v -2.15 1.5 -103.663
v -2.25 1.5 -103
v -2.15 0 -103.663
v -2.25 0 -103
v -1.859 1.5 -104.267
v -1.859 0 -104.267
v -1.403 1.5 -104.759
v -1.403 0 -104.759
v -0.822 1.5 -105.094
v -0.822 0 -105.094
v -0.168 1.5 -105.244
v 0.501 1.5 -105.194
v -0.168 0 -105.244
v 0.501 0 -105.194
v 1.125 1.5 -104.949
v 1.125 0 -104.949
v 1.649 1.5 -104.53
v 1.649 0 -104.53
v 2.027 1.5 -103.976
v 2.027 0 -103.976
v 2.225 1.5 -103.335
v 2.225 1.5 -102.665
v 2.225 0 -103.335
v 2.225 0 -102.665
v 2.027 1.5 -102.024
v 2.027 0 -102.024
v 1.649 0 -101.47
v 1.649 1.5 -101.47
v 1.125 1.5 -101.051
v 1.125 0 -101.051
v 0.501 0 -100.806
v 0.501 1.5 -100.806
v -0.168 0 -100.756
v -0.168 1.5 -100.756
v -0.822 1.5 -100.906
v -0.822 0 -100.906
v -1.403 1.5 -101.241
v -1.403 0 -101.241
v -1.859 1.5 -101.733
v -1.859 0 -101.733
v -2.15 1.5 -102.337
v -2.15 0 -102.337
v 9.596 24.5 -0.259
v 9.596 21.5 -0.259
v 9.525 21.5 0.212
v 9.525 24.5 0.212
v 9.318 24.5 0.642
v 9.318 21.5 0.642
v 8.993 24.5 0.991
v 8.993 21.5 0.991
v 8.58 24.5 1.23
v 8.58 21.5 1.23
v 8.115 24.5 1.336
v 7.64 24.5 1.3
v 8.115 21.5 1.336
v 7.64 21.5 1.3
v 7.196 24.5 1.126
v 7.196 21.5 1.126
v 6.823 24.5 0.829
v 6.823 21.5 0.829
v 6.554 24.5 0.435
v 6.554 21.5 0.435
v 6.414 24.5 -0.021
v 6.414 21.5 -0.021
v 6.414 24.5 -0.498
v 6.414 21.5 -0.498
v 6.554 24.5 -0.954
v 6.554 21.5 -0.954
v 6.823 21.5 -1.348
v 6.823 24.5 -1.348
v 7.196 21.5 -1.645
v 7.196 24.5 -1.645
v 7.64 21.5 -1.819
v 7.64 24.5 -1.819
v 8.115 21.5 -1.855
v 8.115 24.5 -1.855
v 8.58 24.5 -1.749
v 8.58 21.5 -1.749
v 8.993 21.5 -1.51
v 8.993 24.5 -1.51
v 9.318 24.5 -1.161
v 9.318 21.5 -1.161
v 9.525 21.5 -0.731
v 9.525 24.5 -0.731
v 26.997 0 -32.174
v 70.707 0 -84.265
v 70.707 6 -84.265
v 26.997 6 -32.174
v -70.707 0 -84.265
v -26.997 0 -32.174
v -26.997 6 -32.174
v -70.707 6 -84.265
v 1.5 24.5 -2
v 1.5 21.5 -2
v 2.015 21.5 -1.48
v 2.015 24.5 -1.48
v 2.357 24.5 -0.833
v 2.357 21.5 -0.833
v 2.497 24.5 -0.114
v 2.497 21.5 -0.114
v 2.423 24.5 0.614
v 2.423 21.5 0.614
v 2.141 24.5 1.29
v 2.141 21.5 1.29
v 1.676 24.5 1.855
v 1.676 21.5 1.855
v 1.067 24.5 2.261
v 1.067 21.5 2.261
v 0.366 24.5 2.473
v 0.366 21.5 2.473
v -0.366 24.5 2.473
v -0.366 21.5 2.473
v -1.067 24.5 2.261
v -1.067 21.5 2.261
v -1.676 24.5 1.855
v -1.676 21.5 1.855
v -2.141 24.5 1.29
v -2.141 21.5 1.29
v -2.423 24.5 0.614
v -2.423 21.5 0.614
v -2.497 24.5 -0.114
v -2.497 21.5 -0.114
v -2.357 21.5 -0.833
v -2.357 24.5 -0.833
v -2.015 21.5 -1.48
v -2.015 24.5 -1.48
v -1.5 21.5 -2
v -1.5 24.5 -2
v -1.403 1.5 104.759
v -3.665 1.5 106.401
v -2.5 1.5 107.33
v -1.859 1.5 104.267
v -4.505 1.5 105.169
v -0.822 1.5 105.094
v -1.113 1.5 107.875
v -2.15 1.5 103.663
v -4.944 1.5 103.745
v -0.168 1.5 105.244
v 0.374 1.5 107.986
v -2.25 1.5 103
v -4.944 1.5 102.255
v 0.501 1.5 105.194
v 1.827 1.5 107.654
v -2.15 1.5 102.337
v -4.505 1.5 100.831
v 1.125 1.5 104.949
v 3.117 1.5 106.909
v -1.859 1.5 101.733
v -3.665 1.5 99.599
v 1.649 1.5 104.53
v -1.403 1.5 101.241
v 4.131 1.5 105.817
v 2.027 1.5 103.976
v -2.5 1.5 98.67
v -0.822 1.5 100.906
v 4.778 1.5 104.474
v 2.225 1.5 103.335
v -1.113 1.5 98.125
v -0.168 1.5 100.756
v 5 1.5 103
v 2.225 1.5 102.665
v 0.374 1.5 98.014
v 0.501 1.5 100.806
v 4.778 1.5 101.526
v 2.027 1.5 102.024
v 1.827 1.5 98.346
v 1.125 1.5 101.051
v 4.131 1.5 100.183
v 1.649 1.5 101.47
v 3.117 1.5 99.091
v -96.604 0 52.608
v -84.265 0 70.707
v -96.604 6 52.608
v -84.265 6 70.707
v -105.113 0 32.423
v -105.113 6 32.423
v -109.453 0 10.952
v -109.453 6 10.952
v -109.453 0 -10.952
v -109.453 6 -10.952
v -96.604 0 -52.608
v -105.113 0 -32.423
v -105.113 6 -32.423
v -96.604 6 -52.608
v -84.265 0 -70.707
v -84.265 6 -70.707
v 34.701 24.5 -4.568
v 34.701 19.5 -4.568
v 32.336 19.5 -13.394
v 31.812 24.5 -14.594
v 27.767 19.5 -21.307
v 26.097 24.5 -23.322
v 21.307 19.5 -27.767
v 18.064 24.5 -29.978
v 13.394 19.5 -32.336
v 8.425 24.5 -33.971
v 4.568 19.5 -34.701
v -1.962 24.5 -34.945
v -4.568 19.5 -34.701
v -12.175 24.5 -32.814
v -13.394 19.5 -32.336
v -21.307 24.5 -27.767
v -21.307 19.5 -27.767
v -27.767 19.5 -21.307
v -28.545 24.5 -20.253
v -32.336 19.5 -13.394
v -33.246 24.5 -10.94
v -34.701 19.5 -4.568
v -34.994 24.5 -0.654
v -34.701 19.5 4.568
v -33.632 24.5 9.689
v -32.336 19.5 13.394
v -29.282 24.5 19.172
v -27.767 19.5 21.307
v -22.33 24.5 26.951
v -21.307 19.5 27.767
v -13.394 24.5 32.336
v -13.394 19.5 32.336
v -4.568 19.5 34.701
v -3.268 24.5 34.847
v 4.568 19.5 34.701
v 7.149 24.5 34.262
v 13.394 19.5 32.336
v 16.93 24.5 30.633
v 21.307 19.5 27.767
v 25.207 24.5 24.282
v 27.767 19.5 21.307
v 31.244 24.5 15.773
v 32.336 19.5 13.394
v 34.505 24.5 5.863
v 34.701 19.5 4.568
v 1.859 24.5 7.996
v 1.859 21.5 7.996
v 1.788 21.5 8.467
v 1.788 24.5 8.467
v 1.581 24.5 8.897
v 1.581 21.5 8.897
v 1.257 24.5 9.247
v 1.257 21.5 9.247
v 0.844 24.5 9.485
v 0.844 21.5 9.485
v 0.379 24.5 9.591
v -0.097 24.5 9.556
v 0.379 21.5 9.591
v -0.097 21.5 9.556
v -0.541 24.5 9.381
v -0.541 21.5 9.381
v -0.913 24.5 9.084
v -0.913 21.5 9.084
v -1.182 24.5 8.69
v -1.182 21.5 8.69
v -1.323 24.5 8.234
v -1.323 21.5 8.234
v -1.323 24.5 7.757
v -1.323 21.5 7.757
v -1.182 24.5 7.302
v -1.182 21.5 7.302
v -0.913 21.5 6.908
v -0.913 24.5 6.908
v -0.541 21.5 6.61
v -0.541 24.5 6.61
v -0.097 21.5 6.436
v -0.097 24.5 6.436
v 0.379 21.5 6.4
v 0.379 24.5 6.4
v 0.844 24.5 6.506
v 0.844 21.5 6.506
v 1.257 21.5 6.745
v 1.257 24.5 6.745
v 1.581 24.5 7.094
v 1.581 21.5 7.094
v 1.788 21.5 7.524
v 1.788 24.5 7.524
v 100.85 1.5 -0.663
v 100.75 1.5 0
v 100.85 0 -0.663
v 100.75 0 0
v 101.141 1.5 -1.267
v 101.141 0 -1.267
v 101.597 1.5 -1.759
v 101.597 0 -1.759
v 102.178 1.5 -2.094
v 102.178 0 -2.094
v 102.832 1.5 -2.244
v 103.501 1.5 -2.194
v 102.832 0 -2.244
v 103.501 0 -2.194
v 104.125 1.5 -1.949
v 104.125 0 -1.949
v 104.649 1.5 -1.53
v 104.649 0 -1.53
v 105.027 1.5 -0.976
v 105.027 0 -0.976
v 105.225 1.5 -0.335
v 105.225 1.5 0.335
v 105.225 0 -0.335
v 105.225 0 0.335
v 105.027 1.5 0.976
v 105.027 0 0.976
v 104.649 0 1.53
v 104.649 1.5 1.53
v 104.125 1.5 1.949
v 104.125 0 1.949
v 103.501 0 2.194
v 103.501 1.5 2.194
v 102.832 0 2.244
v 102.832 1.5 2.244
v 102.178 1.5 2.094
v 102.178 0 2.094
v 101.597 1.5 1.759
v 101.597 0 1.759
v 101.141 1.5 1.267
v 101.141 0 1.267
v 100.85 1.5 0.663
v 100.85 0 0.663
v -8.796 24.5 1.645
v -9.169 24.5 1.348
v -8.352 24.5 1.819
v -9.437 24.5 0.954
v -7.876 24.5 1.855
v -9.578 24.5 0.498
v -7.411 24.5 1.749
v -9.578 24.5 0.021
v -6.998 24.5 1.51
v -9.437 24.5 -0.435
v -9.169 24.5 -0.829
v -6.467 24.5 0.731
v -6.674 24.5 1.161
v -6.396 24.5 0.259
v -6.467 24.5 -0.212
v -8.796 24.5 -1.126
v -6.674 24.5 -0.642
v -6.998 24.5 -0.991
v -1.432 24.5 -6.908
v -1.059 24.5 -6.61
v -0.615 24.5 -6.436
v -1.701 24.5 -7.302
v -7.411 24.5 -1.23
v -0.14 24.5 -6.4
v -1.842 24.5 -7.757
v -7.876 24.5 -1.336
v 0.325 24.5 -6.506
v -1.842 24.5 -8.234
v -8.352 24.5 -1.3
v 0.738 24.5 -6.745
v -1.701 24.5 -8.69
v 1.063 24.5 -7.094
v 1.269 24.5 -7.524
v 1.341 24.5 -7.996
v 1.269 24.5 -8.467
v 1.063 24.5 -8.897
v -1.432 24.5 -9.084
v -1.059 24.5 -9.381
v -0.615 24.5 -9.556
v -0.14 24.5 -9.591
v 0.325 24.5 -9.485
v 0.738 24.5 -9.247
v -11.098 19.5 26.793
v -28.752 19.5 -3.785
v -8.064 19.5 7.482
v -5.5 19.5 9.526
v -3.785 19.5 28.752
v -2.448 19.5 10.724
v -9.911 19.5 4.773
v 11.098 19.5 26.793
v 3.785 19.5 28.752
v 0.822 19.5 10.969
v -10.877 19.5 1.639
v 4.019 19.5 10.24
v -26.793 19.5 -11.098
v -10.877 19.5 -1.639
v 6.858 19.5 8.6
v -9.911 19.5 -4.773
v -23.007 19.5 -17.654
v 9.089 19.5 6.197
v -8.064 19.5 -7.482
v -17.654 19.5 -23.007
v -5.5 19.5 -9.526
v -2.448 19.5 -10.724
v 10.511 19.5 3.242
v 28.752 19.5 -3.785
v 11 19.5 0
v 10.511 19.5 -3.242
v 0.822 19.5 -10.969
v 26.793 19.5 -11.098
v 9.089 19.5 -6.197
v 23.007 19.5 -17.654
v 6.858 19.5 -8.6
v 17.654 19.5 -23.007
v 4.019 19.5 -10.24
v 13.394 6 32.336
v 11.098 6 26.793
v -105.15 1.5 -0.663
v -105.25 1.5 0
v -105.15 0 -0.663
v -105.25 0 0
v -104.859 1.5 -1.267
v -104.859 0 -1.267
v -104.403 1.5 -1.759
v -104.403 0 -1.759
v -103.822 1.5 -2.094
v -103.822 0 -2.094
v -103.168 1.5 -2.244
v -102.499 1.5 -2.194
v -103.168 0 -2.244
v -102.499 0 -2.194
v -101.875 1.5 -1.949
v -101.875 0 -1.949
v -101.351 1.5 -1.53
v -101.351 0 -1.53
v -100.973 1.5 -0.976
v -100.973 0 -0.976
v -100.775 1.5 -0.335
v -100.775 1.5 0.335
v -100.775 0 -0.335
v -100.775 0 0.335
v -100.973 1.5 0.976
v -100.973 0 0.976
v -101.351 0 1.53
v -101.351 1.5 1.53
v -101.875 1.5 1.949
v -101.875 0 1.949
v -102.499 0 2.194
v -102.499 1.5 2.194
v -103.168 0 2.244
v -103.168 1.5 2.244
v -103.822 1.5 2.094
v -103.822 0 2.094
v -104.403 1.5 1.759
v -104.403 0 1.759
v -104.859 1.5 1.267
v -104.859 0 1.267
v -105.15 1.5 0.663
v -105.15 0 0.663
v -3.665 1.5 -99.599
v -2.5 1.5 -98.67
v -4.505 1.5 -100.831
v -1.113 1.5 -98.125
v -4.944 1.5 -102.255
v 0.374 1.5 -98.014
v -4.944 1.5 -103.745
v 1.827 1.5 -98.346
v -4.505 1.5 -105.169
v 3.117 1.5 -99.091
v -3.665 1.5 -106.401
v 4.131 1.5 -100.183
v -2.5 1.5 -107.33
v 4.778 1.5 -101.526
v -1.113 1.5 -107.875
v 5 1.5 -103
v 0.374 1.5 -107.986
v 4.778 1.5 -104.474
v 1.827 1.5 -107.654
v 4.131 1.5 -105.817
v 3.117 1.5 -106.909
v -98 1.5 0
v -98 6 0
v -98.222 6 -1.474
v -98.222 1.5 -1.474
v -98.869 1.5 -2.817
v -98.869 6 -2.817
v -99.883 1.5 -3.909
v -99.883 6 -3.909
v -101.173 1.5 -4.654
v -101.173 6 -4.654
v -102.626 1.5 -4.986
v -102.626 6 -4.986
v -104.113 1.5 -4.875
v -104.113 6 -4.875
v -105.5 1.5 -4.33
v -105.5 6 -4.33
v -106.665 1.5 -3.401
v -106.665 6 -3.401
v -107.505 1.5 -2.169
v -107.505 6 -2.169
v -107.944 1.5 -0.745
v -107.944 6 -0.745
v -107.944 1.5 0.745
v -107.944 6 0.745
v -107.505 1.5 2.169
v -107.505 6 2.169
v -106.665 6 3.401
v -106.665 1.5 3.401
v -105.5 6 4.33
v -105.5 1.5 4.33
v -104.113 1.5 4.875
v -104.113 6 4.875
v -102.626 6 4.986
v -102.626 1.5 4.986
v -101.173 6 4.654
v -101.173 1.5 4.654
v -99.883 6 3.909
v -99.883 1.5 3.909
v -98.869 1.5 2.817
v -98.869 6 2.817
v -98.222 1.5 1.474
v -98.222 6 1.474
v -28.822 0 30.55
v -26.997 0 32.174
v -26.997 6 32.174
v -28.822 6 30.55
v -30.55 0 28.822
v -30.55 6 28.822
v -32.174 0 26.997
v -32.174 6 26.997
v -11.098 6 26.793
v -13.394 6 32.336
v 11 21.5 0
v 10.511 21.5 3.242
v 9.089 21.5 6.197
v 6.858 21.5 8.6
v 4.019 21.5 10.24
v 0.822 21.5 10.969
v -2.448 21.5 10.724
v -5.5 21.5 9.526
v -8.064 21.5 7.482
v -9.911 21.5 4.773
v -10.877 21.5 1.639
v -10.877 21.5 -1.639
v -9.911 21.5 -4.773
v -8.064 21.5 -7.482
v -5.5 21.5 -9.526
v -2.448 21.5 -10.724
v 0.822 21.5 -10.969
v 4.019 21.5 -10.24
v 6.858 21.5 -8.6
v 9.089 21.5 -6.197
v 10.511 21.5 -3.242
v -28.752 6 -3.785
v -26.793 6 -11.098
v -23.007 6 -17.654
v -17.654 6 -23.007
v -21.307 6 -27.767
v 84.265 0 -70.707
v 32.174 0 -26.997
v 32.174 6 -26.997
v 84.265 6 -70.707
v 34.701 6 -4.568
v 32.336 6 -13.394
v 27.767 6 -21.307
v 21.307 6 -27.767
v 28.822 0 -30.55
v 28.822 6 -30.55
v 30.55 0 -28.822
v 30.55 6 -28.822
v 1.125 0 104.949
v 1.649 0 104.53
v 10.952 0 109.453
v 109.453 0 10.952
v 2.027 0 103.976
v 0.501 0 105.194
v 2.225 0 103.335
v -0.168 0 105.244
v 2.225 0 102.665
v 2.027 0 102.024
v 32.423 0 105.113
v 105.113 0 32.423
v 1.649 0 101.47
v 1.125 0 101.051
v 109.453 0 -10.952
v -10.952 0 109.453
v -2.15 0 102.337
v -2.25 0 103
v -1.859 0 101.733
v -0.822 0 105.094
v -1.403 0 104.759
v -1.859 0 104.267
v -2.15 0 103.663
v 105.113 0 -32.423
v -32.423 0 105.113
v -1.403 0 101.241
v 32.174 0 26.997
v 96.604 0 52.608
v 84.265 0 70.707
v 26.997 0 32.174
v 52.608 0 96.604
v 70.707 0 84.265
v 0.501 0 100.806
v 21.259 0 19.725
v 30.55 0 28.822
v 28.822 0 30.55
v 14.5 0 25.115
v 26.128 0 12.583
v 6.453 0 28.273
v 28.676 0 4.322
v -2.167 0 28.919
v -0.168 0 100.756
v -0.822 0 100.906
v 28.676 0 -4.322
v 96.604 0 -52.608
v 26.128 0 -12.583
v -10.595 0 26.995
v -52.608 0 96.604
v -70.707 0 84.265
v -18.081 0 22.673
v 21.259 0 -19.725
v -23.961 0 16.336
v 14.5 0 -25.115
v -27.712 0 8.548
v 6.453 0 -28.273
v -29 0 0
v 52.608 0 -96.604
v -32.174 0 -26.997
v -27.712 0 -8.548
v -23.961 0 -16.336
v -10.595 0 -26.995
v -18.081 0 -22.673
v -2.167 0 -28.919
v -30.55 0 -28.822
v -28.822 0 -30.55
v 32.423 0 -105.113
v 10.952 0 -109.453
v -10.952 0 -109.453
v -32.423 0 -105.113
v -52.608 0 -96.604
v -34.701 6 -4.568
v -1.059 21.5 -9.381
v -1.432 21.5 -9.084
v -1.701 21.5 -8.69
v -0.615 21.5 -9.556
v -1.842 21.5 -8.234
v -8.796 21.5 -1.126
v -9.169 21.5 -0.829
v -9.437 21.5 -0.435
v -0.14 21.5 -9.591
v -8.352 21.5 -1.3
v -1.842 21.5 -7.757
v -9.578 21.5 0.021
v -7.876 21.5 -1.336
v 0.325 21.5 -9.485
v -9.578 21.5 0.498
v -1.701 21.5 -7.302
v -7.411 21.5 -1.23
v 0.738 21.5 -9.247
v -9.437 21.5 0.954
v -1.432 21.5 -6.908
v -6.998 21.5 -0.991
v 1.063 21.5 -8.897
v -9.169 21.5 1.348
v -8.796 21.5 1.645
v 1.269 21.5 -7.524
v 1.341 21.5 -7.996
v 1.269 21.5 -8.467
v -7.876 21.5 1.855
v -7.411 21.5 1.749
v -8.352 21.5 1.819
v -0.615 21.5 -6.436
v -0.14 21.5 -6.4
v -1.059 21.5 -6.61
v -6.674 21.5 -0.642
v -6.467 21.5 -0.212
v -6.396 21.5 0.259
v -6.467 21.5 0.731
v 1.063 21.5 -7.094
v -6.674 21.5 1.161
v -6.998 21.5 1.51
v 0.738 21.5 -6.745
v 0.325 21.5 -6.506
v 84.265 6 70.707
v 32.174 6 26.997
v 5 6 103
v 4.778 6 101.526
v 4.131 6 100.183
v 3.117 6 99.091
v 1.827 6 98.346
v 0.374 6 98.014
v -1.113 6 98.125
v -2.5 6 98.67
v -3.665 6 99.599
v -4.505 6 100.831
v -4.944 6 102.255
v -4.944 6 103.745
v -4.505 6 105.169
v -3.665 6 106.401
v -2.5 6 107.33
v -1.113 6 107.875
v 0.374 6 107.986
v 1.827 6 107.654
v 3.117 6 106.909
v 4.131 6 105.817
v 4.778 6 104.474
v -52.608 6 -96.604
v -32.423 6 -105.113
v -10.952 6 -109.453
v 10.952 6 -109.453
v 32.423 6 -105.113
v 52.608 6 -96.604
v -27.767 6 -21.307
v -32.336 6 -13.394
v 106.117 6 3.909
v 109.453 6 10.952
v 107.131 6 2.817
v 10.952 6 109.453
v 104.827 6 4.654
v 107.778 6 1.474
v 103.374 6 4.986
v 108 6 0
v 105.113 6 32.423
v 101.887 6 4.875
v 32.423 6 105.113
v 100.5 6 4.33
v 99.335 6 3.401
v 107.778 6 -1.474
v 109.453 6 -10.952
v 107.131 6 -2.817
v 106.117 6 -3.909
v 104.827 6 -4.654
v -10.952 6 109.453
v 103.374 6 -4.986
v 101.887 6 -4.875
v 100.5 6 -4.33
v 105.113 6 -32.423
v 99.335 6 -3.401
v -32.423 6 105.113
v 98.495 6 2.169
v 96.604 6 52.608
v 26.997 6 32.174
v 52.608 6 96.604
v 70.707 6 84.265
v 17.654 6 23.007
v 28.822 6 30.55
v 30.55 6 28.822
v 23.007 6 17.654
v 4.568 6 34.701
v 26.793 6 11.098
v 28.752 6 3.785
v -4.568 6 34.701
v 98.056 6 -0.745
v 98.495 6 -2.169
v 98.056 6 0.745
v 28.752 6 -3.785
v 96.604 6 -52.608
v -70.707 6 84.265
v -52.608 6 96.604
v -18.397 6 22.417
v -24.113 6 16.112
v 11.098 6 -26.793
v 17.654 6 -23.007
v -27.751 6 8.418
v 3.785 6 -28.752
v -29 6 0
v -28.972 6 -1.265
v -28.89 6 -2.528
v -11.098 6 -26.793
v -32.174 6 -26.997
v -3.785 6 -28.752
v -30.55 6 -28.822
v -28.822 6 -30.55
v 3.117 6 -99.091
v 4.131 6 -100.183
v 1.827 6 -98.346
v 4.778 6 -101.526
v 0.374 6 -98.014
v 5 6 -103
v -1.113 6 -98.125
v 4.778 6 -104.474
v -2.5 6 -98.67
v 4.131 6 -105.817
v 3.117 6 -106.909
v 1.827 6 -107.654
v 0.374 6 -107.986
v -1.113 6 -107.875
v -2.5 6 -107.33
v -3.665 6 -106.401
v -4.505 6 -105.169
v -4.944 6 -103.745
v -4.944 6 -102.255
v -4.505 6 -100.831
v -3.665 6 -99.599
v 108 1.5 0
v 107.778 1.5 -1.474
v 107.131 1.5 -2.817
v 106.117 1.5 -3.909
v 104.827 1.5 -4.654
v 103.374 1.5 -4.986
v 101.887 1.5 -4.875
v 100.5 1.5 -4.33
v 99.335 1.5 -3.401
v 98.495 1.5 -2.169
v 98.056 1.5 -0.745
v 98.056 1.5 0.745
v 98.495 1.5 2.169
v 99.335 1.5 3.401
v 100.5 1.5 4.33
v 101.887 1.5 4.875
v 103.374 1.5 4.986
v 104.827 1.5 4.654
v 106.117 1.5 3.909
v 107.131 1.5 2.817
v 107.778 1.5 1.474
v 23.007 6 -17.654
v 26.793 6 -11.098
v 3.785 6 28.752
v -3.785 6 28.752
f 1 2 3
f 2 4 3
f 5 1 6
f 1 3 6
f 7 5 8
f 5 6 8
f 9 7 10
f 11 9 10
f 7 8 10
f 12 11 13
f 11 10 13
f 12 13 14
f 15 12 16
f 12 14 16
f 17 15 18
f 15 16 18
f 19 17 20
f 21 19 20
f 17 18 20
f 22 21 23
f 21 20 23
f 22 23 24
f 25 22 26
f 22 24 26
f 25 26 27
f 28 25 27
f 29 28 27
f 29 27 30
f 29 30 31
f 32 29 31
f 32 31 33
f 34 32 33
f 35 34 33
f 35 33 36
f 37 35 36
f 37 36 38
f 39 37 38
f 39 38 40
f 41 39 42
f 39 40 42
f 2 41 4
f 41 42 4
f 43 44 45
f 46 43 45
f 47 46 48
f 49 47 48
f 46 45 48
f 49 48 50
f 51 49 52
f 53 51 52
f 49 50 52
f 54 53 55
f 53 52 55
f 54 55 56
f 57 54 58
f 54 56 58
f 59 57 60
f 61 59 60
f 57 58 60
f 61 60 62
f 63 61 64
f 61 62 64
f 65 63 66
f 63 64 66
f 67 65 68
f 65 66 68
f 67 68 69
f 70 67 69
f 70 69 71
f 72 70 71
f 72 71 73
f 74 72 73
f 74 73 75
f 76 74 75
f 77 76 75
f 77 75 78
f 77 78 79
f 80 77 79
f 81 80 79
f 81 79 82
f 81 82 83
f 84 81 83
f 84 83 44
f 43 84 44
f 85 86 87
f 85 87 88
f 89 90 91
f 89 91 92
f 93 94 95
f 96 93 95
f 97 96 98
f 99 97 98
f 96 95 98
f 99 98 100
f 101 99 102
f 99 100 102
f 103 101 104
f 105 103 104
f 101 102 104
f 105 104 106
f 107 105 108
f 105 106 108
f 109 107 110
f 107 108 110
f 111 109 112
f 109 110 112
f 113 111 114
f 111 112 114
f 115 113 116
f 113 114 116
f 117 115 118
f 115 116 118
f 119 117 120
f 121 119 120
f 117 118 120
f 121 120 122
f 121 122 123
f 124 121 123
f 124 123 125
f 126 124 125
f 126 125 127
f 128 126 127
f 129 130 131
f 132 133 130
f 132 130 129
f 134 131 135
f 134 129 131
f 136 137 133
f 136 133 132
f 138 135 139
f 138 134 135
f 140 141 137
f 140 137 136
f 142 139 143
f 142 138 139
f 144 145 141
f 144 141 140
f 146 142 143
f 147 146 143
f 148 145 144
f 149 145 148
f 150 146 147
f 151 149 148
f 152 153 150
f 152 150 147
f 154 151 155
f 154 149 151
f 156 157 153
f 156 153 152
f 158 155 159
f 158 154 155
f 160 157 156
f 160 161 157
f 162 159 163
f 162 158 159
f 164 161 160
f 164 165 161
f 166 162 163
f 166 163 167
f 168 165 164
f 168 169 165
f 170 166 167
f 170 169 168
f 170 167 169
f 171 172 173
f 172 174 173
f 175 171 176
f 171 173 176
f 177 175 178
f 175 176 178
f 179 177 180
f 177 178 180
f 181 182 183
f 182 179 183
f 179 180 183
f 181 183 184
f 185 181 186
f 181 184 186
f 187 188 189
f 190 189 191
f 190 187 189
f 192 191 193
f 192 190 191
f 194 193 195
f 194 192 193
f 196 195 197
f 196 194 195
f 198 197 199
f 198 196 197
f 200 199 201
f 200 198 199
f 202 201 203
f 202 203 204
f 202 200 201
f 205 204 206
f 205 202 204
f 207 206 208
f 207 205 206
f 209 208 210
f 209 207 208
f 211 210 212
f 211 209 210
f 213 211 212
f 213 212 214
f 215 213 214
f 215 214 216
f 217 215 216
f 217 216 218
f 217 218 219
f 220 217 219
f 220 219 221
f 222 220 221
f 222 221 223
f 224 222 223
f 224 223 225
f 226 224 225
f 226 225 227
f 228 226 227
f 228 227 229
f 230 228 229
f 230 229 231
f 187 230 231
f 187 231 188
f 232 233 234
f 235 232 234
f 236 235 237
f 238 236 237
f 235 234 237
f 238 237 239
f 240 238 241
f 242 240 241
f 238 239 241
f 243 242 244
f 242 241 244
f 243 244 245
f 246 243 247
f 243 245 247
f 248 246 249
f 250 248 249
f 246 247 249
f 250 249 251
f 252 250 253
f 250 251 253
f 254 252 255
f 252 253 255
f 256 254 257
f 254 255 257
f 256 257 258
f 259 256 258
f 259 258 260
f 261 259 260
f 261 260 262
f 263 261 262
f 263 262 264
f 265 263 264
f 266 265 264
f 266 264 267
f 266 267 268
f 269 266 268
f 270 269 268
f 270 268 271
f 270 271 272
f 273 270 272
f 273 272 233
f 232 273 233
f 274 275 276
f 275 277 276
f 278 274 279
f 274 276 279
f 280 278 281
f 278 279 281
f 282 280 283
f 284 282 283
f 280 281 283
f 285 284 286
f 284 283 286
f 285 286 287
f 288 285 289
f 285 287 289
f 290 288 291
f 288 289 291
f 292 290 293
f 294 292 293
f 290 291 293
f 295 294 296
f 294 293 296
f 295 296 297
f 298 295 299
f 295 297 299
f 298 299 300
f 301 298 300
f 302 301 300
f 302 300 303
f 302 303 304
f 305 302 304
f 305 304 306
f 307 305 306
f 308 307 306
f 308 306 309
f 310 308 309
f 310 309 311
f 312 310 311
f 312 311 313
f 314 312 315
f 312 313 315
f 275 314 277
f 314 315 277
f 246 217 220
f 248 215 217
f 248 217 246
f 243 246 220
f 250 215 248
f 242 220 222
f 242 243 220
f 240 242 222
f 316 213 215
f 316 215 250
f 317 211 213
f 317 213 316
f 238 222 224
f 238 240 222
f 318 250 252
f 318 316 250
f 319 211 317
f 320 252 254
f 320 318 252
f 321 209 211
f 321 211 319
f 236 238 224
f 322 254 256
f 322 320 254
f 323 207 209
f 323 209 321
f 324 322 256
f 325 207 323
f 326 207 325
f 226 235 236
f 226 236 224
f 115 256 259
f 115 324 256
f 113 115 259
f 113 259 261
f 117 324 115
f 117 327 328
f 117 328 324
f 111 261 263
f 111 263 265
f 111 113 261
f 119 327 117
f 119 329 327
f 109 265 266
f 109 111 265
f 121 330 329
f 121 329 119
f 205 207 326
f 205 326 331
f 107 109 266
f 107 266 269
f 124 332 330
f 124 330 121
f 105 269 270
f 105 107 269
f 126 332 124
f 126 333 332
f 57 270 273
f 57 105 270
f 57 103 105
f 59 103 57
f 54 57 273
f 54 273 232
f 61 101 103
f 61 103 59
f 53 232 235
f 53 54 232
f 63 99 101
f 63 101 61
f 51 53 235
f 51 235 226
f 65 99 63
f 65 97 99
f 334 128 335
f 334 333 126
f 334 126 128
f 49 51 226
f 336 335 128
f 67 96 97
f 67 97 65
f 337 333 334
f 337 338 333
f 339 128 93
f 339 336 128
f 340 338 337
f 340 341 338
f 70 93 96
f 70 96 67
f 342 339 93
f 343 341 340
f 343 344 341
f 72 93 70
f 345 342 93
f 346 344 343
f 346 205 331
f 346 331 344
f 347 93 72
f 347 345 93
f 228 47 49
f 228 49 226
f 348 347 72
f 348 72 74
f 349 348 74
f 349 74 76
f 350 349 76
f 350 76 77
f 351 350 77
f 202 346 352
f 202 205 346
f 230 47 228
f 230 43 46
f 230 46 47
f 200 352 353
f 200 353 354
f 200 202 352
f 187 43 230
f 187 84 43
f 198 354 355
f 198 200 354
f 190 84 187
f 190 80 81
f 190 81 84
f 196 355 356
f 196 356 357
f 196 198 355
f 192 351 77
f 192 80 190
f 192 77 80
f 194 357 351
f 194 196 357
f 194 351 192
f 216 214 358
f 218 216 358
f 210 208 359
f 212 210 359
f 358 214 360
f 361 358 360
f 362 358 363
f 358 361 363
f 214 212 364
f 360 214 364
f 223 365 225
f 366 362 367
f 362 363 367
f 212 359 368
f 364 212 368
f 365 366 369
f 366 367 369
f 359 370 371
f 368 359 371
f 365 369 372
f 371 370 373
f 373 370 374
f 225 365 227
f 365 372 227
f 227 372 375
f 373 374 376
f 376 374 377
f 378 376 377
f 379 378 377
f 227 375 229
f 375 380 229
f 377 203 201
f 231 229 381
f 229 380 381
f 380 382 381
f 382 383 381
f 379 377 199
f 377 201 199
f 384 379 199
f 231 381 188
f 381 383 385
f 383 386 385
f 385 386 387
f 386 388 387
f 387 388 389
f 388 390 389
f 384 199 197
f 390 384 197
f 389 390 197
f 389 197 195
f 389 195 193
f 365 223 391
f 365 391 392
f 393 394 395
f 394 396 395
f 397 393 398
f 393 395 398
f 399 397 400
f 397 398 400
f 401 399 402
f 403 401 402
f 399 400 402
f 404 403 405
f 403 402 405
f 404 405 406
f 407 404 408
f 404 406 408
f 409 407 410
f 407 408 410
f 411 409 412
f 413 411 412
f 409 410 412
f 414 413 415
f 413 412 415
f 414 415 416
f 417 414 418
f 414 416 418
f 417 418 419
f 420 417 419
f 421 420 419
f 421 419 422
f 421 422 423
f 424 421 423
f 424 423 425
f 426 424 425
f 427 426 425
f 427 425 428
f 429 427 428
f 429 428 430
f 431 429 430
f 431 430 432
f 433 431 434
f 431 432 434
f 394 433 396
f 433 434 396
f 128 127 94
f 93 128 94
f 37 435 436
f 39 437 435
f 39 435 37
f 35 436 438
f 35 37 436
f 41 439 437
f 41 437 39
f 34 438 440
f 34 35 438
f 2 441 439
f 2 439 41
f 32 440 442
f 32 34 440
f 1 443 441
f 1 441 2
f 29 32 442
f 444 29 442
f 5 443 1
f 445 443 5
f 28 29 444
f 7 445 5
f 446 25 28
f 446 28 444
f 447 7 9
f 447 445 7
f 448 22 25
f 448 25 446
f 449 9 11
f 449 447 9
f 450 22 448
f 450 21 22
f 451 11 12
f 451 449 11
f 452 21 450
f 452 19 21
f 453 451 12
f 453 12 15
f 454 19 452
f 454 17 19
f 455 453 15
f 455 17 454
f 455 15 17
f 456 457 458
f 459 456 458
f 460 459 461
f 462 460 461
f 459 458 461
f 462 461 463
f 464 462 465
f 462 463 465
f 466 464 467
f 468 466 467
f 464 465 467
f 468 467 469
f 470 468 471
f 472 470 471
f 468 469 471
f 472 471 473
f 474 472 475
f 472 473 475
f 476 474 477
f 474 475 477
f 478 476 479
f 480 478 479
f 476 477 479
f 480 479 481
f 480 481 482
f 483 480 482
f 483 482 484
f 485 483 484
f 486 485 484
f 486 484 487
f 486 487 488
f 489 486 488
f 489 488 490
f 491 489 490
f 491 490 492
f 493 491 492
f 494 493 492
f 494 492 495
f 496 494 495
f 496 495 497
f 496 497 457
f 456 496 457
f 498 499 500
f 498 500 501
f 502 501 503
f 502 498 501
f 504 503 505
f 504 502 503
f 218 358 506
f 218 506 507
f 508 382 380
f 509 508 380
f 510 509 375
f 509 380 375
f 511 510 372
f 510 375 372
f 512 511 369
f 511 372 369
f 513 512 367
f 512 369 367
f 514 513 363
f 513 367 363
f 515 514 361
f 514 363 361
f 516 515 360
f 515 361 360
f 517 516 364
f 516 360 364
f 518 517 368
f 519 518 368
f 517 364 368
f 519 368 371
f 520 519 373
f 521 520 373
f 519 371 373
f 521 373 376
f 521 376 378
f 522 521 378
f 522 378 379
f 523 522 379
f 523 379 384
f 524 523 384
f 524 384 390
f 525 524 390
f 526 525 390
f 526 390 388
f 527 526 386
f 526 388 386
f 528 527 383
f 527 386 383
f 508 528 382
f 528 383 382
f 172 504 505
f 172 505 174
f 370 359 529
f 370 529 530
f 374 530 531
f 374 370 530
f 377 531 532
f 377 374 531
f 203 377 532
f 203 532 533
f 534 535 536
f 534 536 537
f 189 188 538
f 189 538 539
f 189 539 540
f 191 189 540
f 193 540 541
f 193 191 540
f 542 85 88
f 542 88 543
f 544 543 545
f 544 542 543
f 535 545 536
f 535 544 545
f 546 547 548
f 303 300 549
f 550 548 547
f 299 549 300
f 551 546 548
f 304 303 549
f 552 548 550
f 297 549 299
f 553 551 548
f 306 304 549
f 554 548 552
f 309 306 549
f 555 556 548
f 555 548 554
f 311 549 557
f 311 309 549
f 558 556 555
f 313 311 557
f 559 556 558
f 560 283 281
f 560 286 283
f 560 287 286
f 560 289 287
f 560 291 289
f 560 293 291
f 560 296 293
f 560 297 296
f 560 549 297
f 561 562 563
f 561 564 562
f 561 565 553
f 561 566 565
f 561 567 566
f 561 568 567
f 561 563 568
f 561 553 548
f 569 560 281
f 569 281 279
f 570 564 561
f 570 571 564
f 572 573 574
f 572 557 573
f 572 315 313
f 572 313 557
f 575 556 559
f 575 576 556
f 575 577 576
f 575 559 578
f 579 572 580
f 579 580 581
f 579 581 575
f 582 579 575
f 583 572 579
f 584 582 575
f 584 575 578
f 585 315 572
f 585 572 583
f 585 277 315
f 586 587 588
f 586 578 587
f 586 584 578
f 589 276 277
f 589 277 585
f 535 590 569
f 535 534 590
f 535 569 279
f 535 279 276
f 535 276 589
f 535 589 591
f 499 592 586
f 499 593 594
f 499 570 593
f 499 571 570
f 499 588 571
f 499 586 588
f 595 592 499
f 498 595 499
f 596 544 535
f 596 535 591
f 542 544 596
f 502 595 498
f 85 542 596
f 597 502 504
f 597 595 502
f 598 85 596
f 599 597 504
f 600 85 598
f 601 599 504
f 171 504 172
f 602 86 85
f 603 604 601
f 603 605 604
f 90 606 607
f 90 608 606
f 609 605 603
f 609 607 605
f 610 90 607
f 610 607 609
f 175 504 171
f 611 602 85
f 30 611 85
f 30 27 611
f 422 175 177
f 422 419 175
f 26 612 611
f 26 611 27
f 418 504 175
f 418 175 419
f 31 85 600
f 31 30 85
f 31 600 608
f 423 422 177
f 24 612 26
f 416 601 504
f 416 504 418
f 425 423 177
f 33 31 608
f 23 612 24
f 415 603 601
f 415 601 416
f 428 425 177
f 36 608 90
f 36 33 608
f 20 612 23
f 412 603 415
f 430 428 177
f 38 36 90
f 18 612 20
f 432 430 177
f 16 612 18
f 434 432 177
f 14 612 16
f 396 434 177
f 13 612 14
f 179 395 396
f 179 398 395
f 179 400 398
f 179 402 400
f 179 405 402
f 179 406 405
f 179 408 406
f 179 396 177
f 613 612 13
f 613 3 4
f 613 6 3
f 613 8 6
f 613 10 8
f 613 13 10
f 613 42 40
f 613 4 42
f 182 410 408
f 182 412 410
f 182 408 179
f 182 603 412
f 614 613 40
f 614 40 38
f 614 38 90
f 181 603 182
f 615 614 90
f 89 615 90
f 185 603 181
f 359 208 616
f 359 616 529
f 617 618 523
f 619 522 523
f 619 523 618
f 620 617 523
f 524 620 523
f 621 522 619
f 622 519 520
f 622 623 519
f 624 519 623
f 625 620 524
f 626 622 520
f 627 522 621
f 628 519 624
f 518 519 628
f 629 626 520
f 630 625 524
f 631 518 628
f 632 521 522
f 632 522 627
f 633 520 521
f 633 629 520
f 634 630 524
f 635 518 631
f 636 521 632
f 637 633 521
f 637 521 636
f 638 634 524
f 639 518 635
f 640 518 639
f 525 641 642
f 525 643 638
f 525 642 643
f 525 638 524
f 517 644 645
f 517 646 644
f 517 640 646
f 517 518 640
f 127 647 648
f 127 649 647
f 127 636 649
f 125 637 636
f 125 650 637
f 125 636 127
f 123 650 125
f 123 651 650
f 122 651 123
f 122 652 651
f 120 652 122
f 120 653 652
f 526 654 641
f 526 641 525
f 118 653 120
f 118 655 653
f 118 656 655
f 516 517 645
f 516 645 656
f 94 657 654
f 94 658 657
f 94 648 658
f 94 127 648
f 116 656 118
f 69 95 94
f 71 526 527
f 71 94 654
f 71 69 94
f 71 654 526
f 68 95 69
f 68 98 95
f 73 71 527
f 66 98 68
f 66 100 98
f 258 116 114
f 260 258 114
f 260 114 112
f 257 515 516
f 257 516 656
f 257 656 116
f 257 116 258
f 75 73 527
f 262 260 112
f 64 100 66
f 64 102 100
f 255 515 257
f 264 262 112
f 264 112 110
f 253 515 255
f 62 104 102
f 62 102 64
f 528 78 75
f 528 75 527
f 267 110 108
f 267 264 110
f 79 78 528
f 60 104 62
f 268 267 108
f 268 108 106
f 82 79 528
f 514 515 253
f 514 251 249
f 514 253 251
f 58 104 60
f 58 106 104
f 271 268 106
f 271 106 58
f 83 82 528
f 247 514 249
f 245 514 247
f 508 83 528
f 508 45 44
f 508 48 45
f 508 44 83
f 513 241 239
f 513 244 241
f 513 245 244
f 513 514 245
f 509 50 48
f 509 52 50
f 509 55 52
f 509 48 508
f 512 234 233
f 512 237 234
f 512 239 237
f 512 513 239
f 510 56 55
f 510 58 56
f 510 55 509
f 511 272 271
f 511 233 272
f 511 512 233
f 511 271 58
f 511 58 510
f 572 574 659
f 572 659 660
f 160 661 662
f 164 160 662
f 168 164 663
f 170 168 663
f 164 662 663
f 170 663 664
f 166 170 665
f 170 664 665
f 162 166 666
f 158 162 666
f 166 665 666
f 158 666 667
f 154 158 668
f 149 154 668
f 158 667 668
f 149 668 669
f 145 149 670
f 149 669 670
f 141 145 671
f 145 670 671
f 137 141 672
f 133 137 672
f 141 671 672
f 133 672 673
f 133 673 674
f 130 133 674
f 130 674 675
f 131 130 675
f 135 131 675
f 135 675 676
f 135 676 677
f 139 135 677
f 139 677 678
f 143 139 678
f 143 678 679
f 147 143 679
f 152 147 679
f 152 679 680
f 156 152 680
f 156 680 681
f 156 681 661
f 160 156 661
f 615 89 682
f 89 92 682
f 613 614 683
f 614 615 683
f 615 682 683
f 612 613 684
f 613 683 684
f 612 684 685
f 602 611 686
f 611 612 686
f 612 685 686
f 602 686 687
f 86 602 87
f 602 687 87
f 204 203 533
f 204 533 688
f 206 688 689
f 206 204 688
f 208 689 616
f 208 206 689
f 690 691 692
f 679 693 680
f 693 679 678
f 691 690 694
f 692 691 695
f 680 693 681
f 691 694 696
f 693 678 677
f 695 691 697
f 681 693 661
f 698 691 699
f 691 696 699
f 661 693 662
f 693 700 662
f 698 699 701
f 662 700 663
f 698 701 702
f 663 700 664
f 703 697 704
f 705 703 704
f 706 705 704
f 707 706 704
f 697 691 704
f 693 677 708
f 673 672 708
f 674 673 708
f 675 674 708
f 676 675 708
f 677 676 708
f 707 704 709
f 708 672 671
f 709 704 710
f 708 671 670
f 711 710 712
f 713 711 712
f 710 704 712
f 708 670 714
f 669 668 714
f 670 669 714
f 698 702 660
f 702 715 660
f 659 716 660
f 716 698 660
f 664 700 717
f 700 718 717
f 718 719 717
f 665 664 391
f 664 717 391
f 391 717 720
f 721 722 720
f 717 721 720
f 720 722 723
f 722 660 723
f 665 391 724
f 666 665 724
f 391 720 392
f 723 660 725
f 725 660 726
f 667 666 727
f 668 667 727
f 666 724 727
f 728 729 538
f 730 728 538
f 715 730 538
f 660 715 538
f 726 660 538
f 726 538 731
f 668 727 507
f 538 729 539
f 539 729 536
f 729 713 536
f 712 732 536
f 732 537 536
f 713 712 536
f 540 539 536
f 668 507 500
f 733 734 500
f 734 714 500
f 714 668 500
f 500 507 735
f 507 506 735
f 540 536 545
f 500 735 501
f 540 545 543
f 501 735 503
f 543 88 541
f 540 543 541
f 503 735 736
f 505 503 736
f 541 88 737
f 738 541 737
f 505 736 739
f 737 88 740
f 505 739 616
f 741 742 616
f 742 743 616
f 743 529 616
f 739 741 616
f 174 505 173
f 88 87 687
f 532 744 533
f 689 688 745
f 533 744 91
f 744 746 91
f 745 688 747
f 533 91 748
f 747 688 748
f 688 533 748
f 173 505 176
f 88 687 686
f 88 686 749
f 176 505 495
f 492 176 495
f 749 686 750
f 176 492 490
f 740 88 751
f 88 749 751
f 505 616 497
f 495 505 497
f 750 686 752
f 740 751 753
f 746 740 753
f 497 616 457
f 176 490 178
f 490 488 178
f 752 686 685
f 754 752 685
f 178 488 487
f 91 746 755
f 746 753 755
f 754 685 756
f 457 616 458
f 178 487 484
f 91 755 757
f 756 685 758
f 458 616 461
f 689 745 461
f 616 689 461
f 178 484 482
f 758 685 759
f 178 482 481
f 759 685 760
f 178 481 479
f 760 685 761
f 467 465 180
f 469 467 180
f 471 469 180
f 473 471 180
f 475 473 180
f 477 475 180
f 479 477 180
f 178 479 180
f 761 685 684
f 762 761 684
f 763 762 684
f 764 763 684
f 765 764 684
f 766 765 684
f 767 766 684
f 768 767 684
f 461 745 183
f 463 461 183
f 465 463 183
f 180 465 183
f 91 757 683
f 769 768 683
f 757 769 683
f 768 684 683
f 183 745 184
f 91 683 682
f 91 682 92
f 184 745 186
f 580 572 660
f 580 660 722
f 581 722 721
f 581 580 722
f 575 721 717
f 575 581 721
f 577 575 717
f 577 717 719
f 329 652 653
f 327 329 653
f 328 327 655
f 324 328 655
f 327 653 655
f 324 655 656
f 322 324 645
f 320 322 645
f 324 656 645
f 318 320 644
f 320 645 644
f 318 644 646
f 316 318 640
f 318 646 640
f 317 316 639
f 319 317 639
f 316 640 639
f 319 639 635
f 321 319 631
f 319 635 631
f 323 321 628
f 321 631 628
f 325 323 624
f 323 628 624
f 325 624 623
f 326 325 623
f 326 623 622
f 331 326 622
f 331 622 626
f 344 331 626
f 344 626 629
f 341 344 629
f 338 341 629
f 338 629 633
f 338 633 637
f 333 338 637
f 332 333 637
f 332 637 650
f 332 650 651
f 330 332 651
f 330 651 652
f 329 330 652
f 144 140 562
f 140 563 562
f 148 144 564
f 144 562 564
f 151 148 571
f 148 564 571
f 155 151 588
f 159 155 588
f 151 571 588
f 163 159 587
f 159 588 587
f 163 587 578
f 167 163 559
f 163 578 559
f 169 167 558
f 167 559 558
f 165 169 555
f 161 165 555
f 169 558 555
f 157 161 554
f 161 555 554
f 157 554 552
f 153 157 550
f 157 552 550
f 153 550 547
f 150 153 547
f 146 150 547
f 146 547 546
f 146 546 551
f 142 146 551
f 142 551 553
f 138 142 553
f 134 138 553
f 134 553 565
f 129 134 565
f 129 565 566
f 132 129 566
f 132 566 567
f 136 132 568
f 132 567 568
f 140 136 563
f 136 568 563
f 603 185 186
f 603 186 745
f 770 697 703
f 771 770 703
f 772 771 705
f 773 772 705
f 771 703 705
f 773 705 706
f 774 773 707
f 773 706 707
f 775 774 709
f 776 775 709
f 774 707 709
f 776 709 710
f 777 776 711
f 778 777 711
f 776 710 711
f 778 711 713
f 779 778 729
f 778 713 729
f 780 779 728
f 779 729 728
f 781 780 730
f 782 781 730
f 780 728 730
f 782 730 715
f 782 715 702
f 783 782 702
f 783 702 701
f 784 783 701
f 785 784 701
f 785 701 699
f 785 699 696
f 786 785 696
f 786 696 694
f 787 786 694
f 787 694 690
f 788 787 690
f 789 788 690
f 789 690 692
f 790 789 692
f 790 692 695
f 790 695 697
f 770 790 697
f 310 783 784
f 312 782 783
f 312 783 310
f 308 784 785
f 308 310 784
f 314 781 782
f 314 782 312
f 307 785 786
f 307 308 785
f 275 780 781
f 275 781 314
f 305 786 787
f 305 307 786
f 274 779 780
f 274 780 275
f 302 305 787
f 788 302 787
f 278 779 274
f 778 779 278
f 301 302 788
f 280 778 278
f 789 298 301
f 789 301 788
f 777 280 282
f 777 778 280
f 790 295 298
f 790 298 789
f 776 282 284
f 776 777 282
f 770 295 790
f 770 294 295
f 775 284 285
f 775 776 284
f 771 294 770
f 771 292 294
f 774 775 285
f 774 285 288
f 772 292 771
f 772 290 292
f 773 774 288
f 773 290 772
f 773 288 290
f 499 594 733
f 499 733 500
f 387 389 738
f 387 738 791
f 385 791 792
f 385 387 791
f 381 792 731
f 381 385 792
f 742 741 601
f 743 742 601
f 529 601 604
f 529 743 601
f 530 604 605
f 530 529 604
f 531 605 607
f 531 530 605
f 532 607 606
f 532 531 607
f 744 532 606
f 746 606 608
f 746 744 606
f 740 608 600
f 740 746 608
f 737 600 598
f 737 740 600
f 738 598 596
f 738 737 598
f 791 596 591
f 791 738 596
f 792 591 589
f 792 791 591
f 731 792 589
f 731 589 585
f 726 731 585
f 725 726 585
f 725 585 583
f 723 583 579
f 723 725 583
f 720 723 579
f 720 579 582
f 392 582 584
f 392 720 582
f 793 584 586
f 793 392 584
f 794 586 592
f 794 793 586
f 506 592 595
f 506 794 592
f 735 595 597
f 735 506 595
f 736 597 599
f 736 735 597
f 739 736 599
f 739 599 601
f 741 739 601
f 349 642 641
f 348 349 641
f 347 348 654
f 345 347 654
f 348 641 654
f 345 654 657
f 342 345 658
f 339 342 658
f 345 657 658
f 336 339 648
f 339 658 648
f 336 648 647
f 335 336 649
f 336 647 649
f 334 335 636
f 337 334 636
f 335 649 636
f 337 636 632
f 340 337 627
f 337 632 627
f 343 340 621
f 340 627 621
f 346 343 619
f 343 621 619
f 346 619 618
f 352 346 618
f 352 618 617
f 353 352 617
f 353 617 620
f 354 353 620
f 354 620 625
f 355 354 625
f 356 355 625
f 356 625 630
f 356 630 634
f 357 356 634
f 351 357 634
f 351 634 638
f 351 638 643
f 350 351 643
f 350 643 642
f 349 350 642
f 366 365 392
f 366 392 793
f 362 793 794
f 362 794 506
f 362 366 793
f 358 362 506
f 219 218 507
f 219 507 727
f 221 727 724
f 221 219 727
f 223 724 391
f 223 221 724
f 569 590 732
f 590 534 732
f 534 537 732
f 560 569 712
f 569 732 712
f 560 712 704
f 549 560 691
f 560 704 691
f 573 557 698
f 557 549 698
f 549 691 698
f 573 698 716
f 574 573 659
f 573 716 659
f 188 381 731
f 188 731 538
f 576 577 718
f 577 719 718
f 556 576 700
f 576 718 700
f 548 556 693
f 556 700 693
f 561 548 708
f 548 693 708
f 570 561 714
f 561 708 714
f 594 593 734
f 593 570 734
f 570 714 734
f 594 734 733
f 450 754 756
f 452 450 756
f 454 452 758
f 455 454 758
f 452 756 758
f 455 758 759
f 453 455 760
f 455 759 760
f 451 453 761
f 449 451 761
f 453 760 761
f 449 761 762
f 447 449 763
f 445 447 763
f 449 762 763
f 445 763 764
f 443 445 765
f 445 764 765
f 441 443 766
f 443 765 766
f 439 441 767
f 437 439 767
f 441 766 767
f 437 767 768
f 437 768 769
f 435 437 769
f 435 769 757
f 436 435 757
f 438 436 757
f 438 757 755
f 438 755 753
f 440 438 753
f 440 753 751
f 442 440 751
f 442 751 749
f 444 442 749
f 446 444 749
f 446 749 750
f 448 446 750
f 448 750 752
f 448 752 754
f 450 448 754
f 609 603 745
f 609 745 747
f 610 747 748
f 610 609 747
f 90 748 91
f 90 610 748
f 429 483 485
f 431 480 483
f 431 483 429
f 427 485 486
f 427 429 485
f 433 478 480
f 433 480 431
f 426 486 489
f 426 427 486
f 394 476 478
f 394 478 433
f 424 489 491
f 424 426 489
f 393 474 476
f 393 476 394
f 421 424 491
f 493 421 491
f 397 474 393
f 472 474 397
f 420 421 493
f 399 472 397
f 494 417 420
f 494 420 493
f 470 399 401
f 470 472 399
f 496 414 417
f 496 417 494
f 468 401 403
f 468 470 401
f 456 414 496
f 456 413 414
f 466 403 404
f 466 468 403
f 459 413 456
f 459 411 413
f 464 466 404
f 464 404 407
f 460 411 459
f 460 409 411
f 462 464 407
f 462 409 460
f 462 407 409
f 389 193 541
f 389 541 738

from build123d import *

# Parameters (mm, degrees)
SCHIZZO1_W                                          = 81
SCHIZZO1_H                                          = 6
ESTRUSIONE_ESTRUSIONE2_START                        = 13.5
ESTRUSIONE_ESTRUSIONE2_DEPTH                        = 13.5
ESTRUSIONE_ESTRUSIONE3_START                        = 5
SCHIZZO4_R                                          = 35
ESTRUSIONE_ESTRUSIONE3_DEPTH                        = 5
TAGLIA_RIVOLUZIONE2_DEPTH                           = 6
RIPETIZIONECIRCOLARE1_COUNT                         = 4
SCHIZZO6_R                                          = 11
TAGLIO_ESTRUSIONE2_DEPTH                            = 2
SCHIZZO7_R                                          = 1.6
TAGLIO_ESTRUSIONE3_DEPTH                            = 22
FORO_LAMATO_PER_VITE_M4_A_TESTA_SOTTILE_D           = 4.5
FORO_LAMATO_PER_VITE_M4_A_TESTA_SOTTILE_DEPTH       = 9
FORO_LAMATO_PER_VITE_M4_A_TESTA_SOTTILE_CBORE_D     = 10
FORO_LAMATO_PER_VITE_M4_A_TESTA_SOTTILE_CBORE_DEPTH = 4.5
FORO_LAMATO_PER_VITE_M4_A_TESTA_SOTTILE_TIP         = 1.351936393


# Read off the part's stored shape, not the designer's step: Taglia-Rivoluzione2
with BuildPart() as part:
    # Schizzo1 → Rivoluzione1 (revolve)
    with BuildSketch(Plane.XY):
        with Locations((-69.5, 3)):
            Rectangle(SCHIZZO1_W, SCHIZZO1_H)
    revolve(axis=Axis((0, 30.5, 0), (0, -1, 0)))

    # Schizzo3 → Estrusione-Estrusione2 (add)
    with BuildSketch(Plane(origin=(0, 6, 0), x_dir=(1, 0, 0), z_dir=(0, 1, 0)).offset(ESTRUSIONE_ESTRUSIONE2_START)):
        with BuildLine():
            Line((21.306650015, 27.76736691), (17.654081441, 23.007246868))
            ThreePointArc((17.654081441, 23.007246868), (25.11473671, 14.5), (28.75190098, 3.785259574))
            Line((28.75190098, 3.785259574), (34.700570148, 4.568416728))
            ThreePointArc((34.700570148, 4.568416728), (30.310889132, 17.5), (21.306650015, 27.76736691))
        make_face()
        with BuildLine():
            ThreePointArc((-21.306650015, 27.76736691), (-30.310889132, 17.5), (-34.700570148, 4.568416728))
            Line((-34.700570148, 4.568416728), (-28.75190098, 3.785259574))
            ThreePointArc((-28.75190098, 3.785259574), (-25.11473671, 14.5), (-17.654081441, 23.007246868))
            Line((-17.654081441, 23.007246868), (-21.306650015, 27.76736691))
        make_face()
        with BuildLine():
            ThreePointArc((-13.393920133, -32.335783638), (0, -35), (13.393920133, -32.335783638))
            Line((13.393920133, -32.335783638), (11.097819539, -26.792506443))
            ThreePointArc((11.097819539, -26.792506443), (0, -29), (-11.097819539, -26.792506443))
            Line((-11.097819539, -26.792506443), (-13.393920133, -32.335783638))
        make_face()
    extrude(amount=-ESTRUSIONE_ESTRUSIONE2_DEPTH)

    # Schizzo4 → Estrusione-Estrusione3 (add)
    with BuildSketch(Plane(origin=(0, 19.5, 0), x_dir=(1, 0, 0), z_dir=(0, 1, 0)).offset(ESTRUSIONE_ESTRUSIONE3_START)):
        with Locations(Location((0, 0, 0), (0, 0, 7.5))):
            Circle(SCHIZZO4_R)
    extrude(amount=-ESTRUSIONE_ESTRUSIONE3_DEPTH)

    # Taglia-Rivoluzione2 outline → Taglia-Rivoluzione2 (cut)
    with BuildSketch(Plane(origin=(0, 0, 0), x_dir=(1, 0, 0), z_dir=(0, 1, 0))):
        with BuildLine():
            Line((-84.264888743, 70.706637066), (-32.173866611, 26.997079607))
            ThreePointArc((-32.173866611, 26.997079607), (-29.69848481, 29.69848481), (-26.997079607, 32.173866611))
            Line((-26.997079607, 32.173866611), (-70.706637066, 84.264888743))
            ThreePointArc((-70.706637066, 84.264888743), (-77.781745931, 77.781745931), (-84.264888743, 70.706637066))
        make_face()
    taglia_rivoluzione2 = extrude(amount=TAGLIA_RIVOLUZIONE2_DEPTH, mode=Mode.SUBTRACT)

    # RipetizioneCircolare1: Taglia-Rivoluzione2 ×4 about axis
    ripetizionecircolare1_axis = Axis((0, 6, 0), (0, 1, 0))
    for i in range(1, RIPETIZIONECIRCOLARE1_COUNT):
        add(taglia_rivoluzione2.rotate(ripetizionecircolare1_axis, i * 360 / RIPETIZIONECIRCOLARE1_COUNT), mode=Mode.SUBTRACT)

    # Schizzo6 → Taglio-Estrusione2 (cut)
    with BuildSketch(Plane.XZ.offset(-19.5)):
        Circle(SCHIZZO6_R)
    extrude(amount=-TAGLIO_ESTRUSIONE2_DEPTH, mode=Mode.SUBTRACT)

    # Schizzo7 → Taglio-Estrusione3 (cut)
    with BuildSketch(Plane.XZ.offset(-21.5)):
        with Locations((-7.995791255, 0.259465219)):
            Circle(SCHIZZO7_R)
        with Locations((0.259465219, 7.995791255)):
            Circle(SCHIZZO7_R)
        with Locations((7.995791255, -0.259465219)):
            Circle(SCHIZZO7_R)
        with Locations((-0.259465219, -7.995791255)):
            Circle(SCHIZZO7_R)
        with BuildLine():
            Line((-1.5, -2), (1.5, -2))
            ThreePointArc((1.5, -2), (0, 2.5), (-1.5, -2))
        make_face()
    extrude(amount=-TAGLIO_ESTRUSIONE3_DEPTH, mode=Mode.SUBTRACT)

    # Foro lamato per Vite M4 a testa sottile cilindrica1
    with Locations(Plane(origin=(0, 6, 0), x_dir=(1, 0, 0), z_dir=(0, 1, 0))):
        with Locations((-103, 0), (103, 0), (0, 103), (0, -103)):
            CounterBoreHole(FORO_LAMATO_PER_VITE_M4_A_TESTA_SOTTILE_D / 2, FORO_LAMATO_PER_VITE_M4_A_TESTA_SOTTILE_CBORE_D / 2, FORO_LAMATO_PER_VITE_M4_A_TESTA_SOTTILE_CBORE_DEPTH, depth=FORO_LAMATO_PER_VITE_M4_A_TESTA_SOTTILE_DEPTH)
            with Locations((0, 0, -(FORO_LAMATO_PER_VITE_M4_A_TESTA_SOTTILE_DEPTH + FORO_LAMATO_PER_VITE_M4_A_TESTA_SOTTILE_TIP / 2))):  # 118° drill point
                Cone(0, FORO_LAMATO_PER_VITE_M4_A_TESTA_SOTTILE_D / 2, FORO_LAMATO_PER_VITE_M4_A_TESTA_SOTTILE_TIP, mode=Mode.SUBTRACT)


solid = part.part
